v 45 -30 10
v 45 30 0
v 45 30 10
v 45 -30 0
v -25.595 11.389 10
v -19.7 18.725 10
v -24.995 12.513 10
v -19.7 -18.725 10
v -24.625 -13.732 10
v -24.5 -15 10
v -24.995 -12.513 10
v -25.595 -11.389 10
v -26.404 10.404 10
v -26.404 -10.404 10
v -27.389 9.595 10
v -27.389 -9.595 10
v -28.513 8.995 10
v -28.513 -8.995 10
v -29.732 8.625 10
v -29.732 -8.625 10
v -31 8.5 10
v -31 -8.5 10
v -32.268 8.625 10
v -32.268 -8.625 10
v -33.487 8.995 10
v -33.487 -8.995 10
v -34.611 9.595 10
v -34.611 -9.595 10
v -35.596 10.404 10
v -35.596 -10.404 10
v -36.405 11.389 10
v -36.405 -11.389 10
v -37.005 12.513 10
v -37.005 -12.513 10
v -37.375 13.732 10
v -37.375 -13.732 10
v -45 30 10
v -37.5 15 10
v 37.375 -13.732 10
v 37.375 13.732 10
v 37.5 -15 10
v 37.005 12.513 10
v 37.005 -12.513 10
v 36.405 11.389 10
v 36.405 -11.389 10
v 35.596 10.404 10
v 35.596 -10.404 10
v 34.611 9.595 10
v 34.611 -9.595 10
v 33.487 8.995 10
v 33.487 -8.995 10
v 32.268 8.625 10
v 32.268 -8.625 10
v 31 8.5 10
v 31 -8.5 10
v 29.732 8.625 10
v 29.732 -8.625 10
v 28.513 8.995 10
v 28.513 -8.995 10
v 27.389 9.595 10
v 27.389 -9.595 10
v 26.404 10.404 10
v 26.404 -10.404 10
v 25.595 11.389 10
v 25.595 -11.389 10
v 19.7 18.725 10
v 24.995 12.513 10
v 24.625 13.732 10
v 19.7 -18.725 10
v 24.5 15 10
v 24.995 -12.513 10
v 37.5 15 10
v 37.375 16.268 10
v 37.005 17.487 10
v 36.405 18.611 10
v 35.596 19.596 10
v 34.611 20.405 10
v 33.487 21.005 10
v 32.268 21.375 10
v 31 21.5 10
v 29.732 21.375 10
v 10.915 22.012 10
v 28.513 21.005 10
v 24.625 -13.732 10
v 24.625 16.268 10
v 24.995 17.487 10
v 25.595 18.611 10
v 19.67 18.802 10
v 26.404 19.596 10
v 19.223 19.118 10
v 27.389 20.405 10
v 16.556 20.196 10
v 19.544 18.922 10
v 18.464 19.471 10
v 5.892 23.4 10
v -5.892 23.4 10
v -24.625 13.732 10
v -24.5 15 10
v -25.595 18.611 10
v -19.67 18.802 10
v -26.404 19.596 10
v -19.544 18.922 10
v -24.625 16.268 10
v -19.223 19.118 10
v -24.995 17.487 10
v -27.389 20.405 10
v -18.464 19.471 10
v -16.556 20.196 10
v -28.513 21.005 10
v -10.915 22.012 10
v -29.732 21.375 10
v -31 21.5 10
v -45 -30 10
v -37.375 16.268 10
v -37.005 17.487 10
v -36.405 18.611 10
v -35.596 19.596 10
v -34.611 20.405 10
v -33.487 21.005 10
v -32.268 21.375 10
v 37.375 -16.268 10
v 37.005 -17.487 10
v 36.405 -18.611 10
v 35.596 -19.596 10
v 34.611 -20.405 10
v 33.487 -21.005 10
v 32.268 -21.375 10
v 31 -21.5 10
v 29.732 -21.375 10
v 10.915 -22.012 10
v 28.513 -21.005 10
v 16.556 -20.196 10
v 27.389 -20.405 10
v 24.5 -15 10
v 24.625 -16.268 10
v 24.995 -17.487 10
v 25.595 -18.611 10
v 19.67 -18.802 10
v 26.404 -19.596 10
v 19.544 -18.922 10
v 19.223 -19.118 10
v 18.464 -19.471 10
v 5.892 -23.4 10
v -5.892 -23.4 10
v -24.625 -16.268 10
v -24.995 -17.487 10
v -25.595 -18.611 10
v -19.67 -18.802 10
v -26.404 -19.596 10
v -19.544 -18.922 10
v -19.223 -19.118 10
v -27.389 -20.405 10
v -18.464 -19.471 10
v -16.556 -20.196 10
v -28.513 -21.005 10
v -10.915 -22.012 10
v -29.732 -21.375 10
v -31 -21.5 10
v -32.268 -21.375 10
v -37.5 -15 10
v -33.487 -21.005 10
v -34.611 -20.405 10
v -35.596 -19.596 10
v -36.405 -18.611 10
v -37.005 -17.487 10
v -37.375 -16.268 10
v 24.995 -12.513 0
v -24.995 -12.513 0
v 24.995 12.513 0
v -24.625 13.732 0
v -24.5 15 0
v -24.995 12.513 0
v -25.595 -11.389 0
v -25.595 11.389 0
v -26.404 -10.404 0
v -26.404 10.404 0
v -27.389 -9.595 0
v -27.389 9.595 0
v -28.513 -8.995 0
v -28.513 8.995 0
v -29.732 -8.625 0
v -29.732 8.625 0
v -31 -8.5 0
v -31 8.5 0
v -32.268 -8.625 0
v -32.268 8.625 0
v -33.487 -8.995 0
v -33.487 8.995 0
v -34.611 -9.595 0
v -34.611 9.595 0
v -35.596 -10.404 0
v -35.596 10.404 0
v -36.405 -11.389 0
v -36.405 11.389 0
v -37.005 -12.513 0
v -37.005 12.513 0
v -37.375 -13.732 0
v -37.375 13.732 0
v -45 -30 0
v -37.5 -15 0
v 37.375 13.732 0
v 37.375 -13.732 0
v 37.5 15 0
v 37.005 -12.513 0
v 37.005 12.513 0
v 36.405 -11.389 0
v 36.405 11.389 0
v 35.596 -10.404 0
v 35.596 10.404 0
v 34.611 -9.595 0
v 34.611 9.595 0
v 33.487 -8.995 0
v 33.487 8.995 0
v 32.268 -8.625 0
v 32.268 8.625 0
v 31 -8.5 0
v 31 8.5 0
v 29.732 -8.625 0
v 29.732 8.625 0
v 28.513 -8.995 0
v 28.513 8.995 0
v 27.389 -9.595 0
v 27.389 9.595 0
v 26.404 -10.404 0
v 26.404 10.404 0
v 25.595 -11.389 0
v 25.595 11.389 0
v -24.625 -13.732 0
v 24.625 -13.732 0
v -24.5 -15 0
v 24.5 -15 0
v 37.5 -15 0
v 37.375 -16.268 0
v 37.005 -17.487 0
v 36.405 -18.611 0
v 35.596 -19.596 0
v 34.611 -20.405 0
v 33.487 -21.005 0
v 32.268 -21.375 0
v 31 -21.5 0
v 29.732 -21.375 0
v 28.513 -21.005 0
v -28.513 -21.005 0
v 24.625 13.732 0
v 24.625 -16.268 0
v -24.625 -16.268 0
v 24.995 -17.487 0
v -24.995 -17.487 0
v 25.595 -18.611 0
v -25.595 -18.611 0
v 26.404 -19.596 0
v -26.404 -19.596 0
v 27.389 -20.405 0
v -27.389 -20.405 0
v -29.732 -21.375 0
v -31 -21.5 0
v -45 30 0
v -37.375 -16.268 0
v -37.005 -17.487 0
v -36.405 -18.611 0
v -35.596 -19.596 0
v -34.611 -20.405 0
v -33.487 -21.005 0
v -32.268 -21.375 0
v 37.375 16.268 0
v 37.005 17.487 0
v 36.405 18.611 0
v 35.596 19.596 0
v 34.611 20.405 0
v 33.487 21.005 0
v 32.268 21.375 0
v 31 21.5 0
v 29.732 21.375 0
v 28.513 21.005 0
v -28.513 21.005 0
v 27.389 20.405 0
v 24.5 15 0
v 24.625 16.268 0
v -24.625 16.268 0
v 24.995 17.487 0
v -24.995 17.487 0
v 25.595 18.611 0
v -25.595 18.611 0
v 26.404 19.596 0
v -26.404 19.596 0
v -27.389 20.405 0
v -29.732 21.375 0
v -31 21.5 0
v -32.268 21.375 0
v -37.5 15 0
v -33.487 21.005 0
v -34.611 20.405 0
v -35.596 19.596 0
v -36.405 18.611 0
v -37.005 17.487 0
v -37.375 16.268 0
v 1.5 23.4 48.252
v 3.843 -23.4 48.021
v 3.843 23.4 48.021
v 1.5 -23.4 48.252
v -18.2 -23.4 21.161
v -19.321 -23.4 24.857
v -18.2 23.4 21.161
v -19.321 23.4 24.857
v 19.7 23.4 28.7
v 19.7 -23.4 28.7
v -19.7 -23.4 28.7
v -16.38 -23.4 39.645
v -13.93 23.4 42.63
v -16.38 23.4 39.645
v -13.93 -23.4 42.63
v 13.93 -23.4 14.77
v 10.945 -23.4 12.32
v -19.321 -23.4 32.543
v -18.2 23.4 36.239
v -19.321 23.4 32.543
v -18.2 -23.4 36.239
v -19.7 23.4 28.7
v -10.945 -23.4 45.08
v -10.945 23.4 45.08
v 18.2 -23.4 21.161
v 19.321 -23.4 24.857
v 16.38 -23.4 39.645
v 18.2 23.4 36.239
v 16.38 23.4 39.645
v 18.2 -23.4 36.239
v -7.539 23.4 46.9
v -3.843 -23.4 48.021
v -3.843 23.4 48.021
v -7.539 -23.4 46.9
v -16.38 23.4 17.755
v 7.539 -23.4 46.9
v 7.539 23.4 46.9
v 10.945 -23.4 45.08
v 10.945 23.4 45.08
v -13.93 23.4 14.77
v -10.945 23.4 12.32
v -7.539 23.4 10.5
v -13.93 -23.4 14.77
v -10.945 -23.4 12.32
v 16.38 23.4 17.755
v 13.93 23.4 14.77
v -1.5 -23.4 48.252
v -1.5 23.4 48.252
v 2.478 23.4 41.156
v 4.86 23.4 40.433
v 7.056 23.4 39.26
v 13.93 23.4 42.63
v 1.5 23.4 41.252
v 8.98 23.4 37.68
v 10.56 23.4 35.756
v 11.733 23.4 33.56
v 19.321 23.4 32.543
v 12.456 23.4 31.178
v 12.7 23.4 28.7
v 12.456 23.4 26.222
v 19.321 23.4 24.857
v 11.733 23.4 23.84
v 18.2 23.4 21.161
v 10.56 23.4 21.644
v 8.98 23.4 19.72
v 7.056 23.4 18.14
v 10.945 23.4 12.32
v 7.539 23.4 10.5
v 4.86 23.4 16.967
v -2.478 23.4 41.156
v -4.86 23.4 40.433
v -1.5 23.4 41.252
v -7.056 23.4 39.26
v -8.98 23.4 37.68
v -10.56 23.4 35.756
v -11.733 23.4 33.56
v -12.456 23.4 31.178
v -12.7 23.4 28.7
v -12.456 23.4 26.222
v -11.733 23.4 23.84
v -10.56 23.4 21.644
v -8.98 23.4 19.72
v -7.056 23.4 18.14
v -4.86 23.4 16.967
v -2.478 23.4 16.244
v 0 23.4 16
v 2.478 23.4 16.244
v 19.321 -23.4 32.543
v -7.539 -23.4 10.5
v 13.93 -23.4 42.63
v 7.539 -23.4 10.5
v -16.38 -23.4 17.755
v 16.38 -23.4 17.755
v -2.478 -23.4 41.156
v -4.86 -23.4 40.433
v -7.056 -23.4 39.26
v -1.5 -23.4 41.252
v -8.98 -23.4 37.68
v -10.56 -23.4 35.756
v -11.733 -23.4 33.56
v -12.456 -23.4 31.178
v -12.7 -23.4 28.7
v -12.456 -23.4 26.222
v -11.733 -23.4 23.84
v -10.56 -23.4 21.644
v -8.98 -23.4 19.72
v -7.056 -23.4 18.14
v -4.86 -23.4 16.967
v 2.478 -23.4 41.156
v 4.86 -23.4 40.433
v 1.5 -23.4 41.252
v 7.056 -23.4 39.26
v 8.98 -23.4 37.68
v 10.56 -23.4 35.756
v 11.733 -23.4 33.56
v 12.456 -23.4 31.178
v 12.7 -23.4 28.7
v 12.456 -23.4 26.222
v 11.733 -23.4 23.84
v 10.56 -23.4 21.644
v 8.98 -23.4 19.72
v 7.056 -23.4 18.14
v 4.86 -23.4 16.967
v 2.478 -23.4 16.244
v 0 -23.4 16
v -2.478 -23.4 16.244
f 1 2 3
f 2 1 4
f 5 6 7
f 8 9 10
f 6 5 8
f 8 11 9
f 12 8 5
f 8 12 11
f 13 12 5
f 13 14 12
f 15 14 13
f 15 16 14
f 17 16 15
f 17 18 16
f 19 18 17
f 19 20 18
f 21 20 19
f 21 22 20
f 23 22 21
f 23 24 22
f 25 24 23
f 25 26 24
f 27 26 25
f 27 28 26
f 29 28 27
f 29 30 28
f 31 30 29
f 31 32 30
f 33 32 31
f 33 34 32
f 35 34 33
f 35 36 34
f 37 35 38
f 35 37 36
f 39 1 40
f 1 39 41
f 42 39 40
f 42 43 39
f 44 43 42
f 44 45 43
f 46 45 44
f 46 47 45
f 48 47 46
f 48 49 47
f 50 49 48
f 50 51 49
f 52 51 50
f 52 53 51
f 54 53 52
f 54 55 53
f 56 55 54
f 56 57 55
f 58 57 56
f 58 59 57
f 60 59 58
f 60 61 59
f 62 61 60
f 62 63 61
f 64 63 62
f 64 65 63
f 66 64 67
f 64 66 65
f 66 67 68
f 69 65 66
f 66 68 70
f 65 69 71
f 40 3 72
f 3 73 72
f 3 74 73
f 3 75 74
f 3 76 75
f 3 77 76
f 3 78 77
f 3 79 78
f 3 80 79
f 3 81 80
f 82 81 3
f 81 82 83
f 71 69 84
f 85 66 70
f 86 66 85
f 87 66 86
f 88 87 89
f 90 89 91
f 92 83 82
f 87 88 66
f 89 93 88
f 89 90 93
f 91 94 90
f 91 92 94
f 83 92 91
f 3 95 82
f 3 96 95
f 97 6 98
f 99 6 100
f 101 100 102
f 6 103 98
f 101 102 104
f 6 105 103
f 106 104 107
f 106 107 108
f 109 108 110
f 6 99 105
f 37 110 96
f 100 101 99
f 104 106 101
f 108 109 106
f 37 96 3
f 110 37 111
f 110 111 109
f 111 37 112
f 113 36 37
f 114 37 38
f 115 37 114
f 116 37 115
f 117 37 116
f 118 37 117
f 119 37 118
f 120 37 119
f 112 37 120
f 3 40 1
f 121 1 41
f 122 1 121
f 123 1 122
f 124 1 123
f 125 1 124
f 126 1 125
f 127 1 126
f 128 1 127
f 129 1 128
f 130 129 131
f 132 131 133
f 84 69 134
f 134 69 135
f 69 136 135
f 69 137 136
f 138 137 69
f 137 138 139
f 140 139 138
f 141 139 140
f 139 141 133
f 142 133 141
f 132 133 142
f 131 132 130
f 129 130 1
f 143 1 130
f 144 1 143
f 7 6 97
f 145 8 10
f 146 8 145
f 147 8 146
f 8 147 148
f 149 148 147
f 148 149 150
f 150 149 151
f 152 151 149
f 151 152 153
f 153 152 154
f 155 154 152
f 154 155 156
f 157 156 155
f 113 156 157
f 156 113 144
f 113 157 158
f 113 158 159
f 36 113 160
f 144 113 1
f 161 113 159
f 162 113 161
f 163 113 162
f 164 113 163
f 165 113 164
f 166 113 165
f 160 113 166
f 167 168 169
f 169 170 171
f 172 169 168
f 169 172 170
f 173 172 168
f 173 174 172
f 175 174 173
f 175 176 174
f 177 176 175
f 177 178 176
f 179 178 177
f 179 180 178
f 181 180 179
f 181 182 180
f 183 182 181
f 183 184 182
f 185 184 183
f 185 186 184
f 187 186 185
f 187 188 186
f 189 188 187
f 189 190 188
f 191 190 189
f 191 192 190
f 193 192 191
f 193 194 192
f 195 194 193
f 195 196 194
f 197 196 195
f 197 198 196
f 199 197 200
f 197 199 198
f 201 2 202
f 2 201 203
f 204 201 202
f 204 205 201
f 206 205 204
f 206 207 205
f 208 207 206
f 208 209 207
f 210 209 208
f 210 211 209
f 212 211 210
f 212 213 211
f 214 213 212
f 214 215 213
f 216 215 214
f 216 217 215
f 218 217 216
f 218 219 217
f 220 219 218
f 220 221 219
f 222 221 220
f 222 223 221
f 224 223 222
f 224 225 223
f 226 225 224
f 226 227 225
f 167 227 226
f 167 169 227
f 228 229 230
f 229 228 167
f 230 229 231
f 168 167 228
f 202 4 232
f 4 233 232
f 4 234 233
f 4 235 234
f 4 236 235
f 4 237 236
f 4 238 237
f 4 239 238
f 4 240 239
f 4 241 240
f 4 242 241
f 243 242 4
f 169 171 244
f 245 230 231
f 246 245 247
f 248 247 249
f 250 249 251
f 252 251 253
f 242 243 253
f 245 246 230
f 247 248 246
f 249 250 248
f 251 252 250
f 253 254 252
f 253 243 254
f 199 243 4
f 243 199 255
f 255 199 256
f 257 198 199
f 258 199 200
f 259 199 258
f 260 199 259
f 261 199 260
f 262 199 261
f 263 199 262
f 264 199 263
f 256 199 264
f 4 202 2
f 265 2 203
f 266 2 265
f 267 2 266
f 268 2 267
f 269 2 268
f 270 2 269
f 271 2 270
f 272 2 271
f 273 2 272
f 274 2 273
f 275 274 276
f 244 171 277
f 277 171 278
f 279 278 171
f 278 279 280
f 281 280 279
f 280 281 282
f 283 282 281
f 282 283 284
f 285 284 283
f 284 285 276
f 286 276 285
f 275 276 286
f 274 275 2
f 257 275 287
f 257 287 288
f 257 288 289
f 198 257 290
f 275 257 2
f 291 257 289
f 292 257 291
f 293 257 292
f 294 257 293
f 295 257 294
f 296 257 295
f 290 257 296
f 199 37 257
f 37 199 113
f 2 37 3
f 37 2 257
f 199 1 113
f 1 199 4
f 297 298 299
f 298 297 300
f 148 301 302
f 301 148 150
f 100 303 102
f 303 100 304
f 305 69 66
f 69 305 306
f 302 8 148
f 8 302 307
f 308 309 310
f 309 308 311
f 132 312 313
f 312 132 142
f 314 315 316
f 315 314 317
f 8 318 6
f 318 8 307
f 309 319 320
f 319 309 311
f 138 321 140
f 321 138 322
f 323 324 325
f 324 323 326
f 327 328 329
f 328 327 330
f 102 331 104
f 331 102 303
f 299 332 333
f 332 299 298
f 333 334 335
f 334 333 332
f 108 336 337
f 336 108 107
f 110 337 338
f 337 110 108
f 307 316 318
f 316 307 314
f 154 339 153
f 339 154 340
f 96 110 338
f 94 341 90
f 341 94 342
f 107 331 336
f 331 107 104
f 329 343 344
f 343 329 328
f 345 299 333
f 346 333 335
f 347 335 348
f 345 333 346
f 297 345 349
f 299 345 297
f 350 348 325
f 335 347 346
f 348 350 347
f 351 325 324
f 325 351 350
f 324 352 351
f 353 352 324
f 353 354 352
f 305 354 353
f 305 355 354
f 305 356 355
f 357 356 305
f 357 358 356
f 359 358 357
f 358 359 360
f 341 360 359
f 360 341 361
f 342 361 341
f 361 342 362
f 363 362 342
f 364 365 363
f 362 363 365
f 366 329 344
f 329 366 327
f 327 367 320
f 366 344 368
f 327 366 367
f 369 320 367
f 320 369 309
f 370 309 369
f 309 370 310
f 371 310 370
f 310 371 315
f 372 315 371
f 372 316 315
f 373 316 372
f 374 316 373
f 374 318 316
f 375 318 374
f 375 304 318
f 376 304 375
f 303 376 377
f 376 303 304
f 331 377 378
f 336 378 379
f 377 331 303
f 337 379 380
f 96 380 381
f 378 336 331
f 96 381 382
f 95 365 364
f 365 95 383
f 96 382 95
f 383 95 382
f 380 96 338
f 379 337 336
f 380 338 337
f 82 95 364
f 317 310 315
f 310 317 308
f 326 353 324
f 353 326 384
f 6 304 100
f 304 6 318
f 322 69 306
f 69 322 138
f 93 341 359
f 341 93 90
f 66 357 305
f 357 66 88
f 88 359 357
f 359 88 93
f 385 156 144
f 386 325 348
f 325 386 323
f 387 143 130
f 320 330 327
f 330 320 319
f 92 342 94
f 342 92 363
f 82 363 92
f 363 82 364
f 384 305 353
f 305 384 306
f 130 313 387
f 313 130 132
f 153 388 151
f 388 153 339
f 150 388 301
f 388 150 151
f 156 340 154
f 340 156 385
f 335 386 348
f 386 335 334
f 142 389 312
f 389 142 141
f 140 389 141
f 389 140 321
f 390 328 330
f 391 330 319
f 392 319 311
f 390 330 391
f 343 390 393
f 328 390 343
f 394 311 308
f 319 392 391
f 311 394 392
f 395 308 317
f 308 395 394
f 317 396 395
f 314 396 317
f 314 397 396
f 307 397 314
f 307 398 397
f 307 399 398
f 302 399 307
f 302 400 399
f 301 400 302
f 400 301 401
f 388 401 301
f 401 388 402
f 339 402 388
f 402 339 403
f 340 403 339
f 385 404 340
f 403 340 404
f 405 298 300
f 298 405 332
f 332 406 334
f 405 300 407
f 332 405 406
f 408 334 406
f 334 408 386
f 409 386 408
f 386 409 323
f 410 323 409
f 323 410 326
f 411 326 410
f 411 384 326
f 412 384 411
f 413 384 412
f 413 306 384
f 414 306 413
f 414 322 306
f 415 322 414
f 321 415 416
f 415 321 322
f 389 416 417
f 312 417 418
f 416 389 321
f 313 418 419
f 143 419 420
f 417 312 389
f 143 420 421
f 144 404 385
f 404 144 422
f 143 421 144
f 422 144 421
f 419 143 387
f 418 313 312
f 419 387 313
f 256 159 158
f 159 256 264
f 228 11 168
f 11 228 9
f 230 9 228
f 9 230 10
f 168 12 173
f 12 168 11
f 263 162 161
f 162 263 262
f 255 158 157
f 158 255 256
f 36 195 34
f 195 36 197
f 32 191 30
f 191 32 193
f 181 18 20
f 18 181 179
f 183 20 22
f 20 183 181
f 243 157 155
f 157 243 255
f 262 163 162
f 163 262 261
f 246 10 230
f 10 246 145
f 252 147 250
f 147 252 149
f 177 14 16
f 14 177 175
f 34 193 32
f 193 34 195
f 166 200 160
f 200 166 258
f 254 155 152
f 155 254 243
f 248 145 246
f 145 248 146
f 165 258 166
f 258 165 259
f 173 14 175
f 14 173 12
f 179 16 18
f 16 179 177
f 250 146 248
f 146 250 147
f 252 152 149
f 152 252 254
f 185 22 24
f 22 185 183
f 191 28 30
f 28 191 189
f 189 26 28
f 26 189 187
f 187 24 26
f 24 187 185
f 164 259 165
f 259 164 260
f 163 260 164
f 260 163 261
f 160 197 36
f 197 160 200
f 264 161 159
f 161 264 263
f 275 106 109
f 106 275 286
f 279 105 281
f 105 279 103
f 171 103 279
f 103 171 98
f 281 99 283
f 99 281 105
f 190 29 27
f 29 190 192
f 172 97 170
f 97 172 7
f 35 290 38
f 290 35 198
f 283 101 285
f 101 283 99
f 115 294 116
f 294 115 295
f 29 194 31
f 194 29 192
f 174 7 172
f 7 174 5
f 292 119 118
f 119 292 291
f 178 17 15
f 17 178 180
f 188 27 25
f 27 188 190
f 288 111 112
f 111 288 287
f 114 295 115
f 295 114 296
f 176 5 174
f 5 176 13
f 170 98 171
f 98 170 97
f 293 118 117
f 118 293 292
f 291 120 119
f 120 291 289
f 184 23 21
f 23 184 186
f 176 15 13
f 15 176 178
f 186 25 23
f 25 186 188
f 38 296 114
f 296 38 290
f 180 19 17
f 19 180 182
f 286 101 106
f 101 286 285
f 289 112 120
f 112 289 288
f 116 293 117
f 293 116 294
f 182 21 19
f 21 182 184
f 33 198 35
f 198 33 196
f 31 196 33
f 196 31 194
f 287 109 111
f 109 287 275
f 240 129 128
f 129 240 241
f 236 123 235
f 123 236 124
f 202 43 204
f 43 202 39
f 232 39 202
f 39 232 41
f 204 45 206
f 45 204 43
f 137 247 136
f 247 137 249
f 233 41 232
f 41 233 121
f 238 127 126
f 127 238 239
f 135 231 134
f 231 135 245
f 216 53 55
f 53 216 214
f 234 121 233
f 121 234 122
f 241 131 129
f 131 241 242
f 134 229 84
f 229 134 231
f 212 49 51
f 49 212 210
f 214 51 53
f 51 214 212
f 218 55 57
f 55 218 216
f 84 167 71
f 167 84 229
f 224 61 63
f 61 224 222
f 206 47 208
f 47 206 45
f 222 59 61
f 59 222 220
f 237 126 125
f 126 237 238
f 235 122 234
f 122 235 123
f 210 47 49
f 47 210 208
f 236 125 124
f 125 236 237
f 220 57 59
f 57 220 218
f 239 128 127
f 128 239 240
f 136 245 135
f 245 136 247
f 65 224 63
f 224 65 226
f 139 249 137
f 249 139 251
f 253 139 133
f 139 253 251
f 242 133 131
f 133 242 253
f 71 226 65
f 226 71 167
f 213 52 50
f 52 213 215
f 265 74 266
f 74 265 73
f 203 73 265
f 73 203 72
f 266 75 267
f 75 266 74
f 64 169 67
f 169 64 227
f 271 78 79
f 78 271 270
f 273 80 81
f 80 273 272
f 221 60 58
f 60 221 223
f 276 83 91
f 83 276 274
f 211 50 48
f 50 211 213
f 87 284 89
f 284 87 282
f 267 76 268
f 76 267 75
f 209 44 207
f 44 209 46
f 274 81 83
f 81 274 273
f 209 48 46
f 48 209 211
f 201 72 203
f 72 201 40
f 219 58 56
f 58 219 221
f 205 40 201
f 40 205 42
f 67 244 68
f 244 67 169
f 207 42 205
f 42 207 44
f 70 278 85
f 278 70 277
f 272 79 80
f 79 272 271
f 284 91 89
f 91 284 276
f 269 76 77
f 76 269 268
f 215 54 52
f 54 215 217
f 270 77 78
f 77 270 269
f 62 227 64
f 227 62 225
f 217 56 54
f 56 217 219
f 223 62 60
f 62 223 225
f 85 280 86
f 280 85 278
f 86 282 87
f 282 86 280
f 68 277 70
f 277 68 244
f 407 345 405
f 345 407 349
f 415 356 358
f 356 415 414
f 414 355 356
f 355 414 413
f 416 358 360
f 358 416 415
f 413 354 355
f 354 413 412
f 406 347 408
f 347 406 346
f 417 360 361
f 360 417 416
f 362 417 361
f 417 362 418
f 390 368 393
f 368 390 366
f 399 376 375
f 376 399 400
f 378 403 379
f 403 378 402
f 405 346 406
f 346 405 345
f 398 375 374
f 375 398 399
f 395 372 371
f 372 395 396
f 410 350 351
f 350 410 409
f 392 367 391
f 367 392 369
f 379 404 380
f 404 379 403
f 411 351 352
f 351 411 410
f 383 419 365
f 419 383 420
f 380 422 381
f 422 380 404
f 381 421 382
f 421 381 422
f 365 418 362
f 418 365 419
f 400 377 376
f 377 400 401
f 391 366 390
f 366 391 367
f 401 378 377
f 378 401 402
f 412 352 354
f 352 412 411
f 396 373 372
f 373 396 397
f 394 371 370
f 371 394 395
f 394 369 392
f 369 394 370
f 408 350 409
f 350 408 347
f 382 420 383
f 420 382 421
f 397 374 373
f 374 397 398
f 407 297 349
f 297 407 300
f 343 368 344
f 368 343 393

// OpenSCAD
$fn = 32;

// ----------------------------------------------------------------------
// Bearing block: 90 x 60 mm base, 25.4 mm bore at 28.7 mm
// ----------------------------------------------------------------------

// --- parameters (mm) ---
base_w = 90;              // base width
base_d = 60;              // base depth
base_t = 10;              // base thickness
bore_d = 25.4;            // shaft / bearing bore
house_r = 19.7;           // housing outer radius
house_len = 46.8;         // housing length along the shaft
foot_w = 39.4;            // foot width under the housing
foot_len = 36.8;          // foot length along the shaft
axis_z = 28.7;            // bore axis height above the base
holes_d = 13;             // mounting holes
hole_x = 31;              // mounting hole spacing
groove_w = 3;             // oil groove width

difference() {
  union() {
    /* base plate with its underside on z = 0 */
    translate([0, 0, base_t / 2]) cube([base_w, base_d, base_t], center = true);
    /* hull foot: a straight web blending into the round housing */
    hull() {
      translate([0, 0, base_t - 0.5]) cube([foot_w, foot_len, 1.6], center = true);
      translate([0, 0, axis_z]) rotate([-90, 0, 0]) cylinder(h = house_len, d = 2 * house_r, center = true);
    }
  }
  /* bore through the housing, 2.5 mm clear on both sides */
  translate([0, 0, axis_z]) rotate([-90, 0, 0]) cylinder(h = house_len + 5, d = bore_d, center = true);
  /* oil groove from the top of the housing into the bore */
  translate([-groove_w / 2, -house_len / 2 - 2.5, axis_z + bore_d * 0.17]) cube([groove_w, house_len + 5, house_r + 5]);
  /* mounting holes through the base plate */
  for (hx = [-31, 31]) {
    for (hy = [-15, 15]) {
      translate([hx, hy, -2.5]) cylinder(h = base_t + 5, d = holes_d);
    }
  }
}
